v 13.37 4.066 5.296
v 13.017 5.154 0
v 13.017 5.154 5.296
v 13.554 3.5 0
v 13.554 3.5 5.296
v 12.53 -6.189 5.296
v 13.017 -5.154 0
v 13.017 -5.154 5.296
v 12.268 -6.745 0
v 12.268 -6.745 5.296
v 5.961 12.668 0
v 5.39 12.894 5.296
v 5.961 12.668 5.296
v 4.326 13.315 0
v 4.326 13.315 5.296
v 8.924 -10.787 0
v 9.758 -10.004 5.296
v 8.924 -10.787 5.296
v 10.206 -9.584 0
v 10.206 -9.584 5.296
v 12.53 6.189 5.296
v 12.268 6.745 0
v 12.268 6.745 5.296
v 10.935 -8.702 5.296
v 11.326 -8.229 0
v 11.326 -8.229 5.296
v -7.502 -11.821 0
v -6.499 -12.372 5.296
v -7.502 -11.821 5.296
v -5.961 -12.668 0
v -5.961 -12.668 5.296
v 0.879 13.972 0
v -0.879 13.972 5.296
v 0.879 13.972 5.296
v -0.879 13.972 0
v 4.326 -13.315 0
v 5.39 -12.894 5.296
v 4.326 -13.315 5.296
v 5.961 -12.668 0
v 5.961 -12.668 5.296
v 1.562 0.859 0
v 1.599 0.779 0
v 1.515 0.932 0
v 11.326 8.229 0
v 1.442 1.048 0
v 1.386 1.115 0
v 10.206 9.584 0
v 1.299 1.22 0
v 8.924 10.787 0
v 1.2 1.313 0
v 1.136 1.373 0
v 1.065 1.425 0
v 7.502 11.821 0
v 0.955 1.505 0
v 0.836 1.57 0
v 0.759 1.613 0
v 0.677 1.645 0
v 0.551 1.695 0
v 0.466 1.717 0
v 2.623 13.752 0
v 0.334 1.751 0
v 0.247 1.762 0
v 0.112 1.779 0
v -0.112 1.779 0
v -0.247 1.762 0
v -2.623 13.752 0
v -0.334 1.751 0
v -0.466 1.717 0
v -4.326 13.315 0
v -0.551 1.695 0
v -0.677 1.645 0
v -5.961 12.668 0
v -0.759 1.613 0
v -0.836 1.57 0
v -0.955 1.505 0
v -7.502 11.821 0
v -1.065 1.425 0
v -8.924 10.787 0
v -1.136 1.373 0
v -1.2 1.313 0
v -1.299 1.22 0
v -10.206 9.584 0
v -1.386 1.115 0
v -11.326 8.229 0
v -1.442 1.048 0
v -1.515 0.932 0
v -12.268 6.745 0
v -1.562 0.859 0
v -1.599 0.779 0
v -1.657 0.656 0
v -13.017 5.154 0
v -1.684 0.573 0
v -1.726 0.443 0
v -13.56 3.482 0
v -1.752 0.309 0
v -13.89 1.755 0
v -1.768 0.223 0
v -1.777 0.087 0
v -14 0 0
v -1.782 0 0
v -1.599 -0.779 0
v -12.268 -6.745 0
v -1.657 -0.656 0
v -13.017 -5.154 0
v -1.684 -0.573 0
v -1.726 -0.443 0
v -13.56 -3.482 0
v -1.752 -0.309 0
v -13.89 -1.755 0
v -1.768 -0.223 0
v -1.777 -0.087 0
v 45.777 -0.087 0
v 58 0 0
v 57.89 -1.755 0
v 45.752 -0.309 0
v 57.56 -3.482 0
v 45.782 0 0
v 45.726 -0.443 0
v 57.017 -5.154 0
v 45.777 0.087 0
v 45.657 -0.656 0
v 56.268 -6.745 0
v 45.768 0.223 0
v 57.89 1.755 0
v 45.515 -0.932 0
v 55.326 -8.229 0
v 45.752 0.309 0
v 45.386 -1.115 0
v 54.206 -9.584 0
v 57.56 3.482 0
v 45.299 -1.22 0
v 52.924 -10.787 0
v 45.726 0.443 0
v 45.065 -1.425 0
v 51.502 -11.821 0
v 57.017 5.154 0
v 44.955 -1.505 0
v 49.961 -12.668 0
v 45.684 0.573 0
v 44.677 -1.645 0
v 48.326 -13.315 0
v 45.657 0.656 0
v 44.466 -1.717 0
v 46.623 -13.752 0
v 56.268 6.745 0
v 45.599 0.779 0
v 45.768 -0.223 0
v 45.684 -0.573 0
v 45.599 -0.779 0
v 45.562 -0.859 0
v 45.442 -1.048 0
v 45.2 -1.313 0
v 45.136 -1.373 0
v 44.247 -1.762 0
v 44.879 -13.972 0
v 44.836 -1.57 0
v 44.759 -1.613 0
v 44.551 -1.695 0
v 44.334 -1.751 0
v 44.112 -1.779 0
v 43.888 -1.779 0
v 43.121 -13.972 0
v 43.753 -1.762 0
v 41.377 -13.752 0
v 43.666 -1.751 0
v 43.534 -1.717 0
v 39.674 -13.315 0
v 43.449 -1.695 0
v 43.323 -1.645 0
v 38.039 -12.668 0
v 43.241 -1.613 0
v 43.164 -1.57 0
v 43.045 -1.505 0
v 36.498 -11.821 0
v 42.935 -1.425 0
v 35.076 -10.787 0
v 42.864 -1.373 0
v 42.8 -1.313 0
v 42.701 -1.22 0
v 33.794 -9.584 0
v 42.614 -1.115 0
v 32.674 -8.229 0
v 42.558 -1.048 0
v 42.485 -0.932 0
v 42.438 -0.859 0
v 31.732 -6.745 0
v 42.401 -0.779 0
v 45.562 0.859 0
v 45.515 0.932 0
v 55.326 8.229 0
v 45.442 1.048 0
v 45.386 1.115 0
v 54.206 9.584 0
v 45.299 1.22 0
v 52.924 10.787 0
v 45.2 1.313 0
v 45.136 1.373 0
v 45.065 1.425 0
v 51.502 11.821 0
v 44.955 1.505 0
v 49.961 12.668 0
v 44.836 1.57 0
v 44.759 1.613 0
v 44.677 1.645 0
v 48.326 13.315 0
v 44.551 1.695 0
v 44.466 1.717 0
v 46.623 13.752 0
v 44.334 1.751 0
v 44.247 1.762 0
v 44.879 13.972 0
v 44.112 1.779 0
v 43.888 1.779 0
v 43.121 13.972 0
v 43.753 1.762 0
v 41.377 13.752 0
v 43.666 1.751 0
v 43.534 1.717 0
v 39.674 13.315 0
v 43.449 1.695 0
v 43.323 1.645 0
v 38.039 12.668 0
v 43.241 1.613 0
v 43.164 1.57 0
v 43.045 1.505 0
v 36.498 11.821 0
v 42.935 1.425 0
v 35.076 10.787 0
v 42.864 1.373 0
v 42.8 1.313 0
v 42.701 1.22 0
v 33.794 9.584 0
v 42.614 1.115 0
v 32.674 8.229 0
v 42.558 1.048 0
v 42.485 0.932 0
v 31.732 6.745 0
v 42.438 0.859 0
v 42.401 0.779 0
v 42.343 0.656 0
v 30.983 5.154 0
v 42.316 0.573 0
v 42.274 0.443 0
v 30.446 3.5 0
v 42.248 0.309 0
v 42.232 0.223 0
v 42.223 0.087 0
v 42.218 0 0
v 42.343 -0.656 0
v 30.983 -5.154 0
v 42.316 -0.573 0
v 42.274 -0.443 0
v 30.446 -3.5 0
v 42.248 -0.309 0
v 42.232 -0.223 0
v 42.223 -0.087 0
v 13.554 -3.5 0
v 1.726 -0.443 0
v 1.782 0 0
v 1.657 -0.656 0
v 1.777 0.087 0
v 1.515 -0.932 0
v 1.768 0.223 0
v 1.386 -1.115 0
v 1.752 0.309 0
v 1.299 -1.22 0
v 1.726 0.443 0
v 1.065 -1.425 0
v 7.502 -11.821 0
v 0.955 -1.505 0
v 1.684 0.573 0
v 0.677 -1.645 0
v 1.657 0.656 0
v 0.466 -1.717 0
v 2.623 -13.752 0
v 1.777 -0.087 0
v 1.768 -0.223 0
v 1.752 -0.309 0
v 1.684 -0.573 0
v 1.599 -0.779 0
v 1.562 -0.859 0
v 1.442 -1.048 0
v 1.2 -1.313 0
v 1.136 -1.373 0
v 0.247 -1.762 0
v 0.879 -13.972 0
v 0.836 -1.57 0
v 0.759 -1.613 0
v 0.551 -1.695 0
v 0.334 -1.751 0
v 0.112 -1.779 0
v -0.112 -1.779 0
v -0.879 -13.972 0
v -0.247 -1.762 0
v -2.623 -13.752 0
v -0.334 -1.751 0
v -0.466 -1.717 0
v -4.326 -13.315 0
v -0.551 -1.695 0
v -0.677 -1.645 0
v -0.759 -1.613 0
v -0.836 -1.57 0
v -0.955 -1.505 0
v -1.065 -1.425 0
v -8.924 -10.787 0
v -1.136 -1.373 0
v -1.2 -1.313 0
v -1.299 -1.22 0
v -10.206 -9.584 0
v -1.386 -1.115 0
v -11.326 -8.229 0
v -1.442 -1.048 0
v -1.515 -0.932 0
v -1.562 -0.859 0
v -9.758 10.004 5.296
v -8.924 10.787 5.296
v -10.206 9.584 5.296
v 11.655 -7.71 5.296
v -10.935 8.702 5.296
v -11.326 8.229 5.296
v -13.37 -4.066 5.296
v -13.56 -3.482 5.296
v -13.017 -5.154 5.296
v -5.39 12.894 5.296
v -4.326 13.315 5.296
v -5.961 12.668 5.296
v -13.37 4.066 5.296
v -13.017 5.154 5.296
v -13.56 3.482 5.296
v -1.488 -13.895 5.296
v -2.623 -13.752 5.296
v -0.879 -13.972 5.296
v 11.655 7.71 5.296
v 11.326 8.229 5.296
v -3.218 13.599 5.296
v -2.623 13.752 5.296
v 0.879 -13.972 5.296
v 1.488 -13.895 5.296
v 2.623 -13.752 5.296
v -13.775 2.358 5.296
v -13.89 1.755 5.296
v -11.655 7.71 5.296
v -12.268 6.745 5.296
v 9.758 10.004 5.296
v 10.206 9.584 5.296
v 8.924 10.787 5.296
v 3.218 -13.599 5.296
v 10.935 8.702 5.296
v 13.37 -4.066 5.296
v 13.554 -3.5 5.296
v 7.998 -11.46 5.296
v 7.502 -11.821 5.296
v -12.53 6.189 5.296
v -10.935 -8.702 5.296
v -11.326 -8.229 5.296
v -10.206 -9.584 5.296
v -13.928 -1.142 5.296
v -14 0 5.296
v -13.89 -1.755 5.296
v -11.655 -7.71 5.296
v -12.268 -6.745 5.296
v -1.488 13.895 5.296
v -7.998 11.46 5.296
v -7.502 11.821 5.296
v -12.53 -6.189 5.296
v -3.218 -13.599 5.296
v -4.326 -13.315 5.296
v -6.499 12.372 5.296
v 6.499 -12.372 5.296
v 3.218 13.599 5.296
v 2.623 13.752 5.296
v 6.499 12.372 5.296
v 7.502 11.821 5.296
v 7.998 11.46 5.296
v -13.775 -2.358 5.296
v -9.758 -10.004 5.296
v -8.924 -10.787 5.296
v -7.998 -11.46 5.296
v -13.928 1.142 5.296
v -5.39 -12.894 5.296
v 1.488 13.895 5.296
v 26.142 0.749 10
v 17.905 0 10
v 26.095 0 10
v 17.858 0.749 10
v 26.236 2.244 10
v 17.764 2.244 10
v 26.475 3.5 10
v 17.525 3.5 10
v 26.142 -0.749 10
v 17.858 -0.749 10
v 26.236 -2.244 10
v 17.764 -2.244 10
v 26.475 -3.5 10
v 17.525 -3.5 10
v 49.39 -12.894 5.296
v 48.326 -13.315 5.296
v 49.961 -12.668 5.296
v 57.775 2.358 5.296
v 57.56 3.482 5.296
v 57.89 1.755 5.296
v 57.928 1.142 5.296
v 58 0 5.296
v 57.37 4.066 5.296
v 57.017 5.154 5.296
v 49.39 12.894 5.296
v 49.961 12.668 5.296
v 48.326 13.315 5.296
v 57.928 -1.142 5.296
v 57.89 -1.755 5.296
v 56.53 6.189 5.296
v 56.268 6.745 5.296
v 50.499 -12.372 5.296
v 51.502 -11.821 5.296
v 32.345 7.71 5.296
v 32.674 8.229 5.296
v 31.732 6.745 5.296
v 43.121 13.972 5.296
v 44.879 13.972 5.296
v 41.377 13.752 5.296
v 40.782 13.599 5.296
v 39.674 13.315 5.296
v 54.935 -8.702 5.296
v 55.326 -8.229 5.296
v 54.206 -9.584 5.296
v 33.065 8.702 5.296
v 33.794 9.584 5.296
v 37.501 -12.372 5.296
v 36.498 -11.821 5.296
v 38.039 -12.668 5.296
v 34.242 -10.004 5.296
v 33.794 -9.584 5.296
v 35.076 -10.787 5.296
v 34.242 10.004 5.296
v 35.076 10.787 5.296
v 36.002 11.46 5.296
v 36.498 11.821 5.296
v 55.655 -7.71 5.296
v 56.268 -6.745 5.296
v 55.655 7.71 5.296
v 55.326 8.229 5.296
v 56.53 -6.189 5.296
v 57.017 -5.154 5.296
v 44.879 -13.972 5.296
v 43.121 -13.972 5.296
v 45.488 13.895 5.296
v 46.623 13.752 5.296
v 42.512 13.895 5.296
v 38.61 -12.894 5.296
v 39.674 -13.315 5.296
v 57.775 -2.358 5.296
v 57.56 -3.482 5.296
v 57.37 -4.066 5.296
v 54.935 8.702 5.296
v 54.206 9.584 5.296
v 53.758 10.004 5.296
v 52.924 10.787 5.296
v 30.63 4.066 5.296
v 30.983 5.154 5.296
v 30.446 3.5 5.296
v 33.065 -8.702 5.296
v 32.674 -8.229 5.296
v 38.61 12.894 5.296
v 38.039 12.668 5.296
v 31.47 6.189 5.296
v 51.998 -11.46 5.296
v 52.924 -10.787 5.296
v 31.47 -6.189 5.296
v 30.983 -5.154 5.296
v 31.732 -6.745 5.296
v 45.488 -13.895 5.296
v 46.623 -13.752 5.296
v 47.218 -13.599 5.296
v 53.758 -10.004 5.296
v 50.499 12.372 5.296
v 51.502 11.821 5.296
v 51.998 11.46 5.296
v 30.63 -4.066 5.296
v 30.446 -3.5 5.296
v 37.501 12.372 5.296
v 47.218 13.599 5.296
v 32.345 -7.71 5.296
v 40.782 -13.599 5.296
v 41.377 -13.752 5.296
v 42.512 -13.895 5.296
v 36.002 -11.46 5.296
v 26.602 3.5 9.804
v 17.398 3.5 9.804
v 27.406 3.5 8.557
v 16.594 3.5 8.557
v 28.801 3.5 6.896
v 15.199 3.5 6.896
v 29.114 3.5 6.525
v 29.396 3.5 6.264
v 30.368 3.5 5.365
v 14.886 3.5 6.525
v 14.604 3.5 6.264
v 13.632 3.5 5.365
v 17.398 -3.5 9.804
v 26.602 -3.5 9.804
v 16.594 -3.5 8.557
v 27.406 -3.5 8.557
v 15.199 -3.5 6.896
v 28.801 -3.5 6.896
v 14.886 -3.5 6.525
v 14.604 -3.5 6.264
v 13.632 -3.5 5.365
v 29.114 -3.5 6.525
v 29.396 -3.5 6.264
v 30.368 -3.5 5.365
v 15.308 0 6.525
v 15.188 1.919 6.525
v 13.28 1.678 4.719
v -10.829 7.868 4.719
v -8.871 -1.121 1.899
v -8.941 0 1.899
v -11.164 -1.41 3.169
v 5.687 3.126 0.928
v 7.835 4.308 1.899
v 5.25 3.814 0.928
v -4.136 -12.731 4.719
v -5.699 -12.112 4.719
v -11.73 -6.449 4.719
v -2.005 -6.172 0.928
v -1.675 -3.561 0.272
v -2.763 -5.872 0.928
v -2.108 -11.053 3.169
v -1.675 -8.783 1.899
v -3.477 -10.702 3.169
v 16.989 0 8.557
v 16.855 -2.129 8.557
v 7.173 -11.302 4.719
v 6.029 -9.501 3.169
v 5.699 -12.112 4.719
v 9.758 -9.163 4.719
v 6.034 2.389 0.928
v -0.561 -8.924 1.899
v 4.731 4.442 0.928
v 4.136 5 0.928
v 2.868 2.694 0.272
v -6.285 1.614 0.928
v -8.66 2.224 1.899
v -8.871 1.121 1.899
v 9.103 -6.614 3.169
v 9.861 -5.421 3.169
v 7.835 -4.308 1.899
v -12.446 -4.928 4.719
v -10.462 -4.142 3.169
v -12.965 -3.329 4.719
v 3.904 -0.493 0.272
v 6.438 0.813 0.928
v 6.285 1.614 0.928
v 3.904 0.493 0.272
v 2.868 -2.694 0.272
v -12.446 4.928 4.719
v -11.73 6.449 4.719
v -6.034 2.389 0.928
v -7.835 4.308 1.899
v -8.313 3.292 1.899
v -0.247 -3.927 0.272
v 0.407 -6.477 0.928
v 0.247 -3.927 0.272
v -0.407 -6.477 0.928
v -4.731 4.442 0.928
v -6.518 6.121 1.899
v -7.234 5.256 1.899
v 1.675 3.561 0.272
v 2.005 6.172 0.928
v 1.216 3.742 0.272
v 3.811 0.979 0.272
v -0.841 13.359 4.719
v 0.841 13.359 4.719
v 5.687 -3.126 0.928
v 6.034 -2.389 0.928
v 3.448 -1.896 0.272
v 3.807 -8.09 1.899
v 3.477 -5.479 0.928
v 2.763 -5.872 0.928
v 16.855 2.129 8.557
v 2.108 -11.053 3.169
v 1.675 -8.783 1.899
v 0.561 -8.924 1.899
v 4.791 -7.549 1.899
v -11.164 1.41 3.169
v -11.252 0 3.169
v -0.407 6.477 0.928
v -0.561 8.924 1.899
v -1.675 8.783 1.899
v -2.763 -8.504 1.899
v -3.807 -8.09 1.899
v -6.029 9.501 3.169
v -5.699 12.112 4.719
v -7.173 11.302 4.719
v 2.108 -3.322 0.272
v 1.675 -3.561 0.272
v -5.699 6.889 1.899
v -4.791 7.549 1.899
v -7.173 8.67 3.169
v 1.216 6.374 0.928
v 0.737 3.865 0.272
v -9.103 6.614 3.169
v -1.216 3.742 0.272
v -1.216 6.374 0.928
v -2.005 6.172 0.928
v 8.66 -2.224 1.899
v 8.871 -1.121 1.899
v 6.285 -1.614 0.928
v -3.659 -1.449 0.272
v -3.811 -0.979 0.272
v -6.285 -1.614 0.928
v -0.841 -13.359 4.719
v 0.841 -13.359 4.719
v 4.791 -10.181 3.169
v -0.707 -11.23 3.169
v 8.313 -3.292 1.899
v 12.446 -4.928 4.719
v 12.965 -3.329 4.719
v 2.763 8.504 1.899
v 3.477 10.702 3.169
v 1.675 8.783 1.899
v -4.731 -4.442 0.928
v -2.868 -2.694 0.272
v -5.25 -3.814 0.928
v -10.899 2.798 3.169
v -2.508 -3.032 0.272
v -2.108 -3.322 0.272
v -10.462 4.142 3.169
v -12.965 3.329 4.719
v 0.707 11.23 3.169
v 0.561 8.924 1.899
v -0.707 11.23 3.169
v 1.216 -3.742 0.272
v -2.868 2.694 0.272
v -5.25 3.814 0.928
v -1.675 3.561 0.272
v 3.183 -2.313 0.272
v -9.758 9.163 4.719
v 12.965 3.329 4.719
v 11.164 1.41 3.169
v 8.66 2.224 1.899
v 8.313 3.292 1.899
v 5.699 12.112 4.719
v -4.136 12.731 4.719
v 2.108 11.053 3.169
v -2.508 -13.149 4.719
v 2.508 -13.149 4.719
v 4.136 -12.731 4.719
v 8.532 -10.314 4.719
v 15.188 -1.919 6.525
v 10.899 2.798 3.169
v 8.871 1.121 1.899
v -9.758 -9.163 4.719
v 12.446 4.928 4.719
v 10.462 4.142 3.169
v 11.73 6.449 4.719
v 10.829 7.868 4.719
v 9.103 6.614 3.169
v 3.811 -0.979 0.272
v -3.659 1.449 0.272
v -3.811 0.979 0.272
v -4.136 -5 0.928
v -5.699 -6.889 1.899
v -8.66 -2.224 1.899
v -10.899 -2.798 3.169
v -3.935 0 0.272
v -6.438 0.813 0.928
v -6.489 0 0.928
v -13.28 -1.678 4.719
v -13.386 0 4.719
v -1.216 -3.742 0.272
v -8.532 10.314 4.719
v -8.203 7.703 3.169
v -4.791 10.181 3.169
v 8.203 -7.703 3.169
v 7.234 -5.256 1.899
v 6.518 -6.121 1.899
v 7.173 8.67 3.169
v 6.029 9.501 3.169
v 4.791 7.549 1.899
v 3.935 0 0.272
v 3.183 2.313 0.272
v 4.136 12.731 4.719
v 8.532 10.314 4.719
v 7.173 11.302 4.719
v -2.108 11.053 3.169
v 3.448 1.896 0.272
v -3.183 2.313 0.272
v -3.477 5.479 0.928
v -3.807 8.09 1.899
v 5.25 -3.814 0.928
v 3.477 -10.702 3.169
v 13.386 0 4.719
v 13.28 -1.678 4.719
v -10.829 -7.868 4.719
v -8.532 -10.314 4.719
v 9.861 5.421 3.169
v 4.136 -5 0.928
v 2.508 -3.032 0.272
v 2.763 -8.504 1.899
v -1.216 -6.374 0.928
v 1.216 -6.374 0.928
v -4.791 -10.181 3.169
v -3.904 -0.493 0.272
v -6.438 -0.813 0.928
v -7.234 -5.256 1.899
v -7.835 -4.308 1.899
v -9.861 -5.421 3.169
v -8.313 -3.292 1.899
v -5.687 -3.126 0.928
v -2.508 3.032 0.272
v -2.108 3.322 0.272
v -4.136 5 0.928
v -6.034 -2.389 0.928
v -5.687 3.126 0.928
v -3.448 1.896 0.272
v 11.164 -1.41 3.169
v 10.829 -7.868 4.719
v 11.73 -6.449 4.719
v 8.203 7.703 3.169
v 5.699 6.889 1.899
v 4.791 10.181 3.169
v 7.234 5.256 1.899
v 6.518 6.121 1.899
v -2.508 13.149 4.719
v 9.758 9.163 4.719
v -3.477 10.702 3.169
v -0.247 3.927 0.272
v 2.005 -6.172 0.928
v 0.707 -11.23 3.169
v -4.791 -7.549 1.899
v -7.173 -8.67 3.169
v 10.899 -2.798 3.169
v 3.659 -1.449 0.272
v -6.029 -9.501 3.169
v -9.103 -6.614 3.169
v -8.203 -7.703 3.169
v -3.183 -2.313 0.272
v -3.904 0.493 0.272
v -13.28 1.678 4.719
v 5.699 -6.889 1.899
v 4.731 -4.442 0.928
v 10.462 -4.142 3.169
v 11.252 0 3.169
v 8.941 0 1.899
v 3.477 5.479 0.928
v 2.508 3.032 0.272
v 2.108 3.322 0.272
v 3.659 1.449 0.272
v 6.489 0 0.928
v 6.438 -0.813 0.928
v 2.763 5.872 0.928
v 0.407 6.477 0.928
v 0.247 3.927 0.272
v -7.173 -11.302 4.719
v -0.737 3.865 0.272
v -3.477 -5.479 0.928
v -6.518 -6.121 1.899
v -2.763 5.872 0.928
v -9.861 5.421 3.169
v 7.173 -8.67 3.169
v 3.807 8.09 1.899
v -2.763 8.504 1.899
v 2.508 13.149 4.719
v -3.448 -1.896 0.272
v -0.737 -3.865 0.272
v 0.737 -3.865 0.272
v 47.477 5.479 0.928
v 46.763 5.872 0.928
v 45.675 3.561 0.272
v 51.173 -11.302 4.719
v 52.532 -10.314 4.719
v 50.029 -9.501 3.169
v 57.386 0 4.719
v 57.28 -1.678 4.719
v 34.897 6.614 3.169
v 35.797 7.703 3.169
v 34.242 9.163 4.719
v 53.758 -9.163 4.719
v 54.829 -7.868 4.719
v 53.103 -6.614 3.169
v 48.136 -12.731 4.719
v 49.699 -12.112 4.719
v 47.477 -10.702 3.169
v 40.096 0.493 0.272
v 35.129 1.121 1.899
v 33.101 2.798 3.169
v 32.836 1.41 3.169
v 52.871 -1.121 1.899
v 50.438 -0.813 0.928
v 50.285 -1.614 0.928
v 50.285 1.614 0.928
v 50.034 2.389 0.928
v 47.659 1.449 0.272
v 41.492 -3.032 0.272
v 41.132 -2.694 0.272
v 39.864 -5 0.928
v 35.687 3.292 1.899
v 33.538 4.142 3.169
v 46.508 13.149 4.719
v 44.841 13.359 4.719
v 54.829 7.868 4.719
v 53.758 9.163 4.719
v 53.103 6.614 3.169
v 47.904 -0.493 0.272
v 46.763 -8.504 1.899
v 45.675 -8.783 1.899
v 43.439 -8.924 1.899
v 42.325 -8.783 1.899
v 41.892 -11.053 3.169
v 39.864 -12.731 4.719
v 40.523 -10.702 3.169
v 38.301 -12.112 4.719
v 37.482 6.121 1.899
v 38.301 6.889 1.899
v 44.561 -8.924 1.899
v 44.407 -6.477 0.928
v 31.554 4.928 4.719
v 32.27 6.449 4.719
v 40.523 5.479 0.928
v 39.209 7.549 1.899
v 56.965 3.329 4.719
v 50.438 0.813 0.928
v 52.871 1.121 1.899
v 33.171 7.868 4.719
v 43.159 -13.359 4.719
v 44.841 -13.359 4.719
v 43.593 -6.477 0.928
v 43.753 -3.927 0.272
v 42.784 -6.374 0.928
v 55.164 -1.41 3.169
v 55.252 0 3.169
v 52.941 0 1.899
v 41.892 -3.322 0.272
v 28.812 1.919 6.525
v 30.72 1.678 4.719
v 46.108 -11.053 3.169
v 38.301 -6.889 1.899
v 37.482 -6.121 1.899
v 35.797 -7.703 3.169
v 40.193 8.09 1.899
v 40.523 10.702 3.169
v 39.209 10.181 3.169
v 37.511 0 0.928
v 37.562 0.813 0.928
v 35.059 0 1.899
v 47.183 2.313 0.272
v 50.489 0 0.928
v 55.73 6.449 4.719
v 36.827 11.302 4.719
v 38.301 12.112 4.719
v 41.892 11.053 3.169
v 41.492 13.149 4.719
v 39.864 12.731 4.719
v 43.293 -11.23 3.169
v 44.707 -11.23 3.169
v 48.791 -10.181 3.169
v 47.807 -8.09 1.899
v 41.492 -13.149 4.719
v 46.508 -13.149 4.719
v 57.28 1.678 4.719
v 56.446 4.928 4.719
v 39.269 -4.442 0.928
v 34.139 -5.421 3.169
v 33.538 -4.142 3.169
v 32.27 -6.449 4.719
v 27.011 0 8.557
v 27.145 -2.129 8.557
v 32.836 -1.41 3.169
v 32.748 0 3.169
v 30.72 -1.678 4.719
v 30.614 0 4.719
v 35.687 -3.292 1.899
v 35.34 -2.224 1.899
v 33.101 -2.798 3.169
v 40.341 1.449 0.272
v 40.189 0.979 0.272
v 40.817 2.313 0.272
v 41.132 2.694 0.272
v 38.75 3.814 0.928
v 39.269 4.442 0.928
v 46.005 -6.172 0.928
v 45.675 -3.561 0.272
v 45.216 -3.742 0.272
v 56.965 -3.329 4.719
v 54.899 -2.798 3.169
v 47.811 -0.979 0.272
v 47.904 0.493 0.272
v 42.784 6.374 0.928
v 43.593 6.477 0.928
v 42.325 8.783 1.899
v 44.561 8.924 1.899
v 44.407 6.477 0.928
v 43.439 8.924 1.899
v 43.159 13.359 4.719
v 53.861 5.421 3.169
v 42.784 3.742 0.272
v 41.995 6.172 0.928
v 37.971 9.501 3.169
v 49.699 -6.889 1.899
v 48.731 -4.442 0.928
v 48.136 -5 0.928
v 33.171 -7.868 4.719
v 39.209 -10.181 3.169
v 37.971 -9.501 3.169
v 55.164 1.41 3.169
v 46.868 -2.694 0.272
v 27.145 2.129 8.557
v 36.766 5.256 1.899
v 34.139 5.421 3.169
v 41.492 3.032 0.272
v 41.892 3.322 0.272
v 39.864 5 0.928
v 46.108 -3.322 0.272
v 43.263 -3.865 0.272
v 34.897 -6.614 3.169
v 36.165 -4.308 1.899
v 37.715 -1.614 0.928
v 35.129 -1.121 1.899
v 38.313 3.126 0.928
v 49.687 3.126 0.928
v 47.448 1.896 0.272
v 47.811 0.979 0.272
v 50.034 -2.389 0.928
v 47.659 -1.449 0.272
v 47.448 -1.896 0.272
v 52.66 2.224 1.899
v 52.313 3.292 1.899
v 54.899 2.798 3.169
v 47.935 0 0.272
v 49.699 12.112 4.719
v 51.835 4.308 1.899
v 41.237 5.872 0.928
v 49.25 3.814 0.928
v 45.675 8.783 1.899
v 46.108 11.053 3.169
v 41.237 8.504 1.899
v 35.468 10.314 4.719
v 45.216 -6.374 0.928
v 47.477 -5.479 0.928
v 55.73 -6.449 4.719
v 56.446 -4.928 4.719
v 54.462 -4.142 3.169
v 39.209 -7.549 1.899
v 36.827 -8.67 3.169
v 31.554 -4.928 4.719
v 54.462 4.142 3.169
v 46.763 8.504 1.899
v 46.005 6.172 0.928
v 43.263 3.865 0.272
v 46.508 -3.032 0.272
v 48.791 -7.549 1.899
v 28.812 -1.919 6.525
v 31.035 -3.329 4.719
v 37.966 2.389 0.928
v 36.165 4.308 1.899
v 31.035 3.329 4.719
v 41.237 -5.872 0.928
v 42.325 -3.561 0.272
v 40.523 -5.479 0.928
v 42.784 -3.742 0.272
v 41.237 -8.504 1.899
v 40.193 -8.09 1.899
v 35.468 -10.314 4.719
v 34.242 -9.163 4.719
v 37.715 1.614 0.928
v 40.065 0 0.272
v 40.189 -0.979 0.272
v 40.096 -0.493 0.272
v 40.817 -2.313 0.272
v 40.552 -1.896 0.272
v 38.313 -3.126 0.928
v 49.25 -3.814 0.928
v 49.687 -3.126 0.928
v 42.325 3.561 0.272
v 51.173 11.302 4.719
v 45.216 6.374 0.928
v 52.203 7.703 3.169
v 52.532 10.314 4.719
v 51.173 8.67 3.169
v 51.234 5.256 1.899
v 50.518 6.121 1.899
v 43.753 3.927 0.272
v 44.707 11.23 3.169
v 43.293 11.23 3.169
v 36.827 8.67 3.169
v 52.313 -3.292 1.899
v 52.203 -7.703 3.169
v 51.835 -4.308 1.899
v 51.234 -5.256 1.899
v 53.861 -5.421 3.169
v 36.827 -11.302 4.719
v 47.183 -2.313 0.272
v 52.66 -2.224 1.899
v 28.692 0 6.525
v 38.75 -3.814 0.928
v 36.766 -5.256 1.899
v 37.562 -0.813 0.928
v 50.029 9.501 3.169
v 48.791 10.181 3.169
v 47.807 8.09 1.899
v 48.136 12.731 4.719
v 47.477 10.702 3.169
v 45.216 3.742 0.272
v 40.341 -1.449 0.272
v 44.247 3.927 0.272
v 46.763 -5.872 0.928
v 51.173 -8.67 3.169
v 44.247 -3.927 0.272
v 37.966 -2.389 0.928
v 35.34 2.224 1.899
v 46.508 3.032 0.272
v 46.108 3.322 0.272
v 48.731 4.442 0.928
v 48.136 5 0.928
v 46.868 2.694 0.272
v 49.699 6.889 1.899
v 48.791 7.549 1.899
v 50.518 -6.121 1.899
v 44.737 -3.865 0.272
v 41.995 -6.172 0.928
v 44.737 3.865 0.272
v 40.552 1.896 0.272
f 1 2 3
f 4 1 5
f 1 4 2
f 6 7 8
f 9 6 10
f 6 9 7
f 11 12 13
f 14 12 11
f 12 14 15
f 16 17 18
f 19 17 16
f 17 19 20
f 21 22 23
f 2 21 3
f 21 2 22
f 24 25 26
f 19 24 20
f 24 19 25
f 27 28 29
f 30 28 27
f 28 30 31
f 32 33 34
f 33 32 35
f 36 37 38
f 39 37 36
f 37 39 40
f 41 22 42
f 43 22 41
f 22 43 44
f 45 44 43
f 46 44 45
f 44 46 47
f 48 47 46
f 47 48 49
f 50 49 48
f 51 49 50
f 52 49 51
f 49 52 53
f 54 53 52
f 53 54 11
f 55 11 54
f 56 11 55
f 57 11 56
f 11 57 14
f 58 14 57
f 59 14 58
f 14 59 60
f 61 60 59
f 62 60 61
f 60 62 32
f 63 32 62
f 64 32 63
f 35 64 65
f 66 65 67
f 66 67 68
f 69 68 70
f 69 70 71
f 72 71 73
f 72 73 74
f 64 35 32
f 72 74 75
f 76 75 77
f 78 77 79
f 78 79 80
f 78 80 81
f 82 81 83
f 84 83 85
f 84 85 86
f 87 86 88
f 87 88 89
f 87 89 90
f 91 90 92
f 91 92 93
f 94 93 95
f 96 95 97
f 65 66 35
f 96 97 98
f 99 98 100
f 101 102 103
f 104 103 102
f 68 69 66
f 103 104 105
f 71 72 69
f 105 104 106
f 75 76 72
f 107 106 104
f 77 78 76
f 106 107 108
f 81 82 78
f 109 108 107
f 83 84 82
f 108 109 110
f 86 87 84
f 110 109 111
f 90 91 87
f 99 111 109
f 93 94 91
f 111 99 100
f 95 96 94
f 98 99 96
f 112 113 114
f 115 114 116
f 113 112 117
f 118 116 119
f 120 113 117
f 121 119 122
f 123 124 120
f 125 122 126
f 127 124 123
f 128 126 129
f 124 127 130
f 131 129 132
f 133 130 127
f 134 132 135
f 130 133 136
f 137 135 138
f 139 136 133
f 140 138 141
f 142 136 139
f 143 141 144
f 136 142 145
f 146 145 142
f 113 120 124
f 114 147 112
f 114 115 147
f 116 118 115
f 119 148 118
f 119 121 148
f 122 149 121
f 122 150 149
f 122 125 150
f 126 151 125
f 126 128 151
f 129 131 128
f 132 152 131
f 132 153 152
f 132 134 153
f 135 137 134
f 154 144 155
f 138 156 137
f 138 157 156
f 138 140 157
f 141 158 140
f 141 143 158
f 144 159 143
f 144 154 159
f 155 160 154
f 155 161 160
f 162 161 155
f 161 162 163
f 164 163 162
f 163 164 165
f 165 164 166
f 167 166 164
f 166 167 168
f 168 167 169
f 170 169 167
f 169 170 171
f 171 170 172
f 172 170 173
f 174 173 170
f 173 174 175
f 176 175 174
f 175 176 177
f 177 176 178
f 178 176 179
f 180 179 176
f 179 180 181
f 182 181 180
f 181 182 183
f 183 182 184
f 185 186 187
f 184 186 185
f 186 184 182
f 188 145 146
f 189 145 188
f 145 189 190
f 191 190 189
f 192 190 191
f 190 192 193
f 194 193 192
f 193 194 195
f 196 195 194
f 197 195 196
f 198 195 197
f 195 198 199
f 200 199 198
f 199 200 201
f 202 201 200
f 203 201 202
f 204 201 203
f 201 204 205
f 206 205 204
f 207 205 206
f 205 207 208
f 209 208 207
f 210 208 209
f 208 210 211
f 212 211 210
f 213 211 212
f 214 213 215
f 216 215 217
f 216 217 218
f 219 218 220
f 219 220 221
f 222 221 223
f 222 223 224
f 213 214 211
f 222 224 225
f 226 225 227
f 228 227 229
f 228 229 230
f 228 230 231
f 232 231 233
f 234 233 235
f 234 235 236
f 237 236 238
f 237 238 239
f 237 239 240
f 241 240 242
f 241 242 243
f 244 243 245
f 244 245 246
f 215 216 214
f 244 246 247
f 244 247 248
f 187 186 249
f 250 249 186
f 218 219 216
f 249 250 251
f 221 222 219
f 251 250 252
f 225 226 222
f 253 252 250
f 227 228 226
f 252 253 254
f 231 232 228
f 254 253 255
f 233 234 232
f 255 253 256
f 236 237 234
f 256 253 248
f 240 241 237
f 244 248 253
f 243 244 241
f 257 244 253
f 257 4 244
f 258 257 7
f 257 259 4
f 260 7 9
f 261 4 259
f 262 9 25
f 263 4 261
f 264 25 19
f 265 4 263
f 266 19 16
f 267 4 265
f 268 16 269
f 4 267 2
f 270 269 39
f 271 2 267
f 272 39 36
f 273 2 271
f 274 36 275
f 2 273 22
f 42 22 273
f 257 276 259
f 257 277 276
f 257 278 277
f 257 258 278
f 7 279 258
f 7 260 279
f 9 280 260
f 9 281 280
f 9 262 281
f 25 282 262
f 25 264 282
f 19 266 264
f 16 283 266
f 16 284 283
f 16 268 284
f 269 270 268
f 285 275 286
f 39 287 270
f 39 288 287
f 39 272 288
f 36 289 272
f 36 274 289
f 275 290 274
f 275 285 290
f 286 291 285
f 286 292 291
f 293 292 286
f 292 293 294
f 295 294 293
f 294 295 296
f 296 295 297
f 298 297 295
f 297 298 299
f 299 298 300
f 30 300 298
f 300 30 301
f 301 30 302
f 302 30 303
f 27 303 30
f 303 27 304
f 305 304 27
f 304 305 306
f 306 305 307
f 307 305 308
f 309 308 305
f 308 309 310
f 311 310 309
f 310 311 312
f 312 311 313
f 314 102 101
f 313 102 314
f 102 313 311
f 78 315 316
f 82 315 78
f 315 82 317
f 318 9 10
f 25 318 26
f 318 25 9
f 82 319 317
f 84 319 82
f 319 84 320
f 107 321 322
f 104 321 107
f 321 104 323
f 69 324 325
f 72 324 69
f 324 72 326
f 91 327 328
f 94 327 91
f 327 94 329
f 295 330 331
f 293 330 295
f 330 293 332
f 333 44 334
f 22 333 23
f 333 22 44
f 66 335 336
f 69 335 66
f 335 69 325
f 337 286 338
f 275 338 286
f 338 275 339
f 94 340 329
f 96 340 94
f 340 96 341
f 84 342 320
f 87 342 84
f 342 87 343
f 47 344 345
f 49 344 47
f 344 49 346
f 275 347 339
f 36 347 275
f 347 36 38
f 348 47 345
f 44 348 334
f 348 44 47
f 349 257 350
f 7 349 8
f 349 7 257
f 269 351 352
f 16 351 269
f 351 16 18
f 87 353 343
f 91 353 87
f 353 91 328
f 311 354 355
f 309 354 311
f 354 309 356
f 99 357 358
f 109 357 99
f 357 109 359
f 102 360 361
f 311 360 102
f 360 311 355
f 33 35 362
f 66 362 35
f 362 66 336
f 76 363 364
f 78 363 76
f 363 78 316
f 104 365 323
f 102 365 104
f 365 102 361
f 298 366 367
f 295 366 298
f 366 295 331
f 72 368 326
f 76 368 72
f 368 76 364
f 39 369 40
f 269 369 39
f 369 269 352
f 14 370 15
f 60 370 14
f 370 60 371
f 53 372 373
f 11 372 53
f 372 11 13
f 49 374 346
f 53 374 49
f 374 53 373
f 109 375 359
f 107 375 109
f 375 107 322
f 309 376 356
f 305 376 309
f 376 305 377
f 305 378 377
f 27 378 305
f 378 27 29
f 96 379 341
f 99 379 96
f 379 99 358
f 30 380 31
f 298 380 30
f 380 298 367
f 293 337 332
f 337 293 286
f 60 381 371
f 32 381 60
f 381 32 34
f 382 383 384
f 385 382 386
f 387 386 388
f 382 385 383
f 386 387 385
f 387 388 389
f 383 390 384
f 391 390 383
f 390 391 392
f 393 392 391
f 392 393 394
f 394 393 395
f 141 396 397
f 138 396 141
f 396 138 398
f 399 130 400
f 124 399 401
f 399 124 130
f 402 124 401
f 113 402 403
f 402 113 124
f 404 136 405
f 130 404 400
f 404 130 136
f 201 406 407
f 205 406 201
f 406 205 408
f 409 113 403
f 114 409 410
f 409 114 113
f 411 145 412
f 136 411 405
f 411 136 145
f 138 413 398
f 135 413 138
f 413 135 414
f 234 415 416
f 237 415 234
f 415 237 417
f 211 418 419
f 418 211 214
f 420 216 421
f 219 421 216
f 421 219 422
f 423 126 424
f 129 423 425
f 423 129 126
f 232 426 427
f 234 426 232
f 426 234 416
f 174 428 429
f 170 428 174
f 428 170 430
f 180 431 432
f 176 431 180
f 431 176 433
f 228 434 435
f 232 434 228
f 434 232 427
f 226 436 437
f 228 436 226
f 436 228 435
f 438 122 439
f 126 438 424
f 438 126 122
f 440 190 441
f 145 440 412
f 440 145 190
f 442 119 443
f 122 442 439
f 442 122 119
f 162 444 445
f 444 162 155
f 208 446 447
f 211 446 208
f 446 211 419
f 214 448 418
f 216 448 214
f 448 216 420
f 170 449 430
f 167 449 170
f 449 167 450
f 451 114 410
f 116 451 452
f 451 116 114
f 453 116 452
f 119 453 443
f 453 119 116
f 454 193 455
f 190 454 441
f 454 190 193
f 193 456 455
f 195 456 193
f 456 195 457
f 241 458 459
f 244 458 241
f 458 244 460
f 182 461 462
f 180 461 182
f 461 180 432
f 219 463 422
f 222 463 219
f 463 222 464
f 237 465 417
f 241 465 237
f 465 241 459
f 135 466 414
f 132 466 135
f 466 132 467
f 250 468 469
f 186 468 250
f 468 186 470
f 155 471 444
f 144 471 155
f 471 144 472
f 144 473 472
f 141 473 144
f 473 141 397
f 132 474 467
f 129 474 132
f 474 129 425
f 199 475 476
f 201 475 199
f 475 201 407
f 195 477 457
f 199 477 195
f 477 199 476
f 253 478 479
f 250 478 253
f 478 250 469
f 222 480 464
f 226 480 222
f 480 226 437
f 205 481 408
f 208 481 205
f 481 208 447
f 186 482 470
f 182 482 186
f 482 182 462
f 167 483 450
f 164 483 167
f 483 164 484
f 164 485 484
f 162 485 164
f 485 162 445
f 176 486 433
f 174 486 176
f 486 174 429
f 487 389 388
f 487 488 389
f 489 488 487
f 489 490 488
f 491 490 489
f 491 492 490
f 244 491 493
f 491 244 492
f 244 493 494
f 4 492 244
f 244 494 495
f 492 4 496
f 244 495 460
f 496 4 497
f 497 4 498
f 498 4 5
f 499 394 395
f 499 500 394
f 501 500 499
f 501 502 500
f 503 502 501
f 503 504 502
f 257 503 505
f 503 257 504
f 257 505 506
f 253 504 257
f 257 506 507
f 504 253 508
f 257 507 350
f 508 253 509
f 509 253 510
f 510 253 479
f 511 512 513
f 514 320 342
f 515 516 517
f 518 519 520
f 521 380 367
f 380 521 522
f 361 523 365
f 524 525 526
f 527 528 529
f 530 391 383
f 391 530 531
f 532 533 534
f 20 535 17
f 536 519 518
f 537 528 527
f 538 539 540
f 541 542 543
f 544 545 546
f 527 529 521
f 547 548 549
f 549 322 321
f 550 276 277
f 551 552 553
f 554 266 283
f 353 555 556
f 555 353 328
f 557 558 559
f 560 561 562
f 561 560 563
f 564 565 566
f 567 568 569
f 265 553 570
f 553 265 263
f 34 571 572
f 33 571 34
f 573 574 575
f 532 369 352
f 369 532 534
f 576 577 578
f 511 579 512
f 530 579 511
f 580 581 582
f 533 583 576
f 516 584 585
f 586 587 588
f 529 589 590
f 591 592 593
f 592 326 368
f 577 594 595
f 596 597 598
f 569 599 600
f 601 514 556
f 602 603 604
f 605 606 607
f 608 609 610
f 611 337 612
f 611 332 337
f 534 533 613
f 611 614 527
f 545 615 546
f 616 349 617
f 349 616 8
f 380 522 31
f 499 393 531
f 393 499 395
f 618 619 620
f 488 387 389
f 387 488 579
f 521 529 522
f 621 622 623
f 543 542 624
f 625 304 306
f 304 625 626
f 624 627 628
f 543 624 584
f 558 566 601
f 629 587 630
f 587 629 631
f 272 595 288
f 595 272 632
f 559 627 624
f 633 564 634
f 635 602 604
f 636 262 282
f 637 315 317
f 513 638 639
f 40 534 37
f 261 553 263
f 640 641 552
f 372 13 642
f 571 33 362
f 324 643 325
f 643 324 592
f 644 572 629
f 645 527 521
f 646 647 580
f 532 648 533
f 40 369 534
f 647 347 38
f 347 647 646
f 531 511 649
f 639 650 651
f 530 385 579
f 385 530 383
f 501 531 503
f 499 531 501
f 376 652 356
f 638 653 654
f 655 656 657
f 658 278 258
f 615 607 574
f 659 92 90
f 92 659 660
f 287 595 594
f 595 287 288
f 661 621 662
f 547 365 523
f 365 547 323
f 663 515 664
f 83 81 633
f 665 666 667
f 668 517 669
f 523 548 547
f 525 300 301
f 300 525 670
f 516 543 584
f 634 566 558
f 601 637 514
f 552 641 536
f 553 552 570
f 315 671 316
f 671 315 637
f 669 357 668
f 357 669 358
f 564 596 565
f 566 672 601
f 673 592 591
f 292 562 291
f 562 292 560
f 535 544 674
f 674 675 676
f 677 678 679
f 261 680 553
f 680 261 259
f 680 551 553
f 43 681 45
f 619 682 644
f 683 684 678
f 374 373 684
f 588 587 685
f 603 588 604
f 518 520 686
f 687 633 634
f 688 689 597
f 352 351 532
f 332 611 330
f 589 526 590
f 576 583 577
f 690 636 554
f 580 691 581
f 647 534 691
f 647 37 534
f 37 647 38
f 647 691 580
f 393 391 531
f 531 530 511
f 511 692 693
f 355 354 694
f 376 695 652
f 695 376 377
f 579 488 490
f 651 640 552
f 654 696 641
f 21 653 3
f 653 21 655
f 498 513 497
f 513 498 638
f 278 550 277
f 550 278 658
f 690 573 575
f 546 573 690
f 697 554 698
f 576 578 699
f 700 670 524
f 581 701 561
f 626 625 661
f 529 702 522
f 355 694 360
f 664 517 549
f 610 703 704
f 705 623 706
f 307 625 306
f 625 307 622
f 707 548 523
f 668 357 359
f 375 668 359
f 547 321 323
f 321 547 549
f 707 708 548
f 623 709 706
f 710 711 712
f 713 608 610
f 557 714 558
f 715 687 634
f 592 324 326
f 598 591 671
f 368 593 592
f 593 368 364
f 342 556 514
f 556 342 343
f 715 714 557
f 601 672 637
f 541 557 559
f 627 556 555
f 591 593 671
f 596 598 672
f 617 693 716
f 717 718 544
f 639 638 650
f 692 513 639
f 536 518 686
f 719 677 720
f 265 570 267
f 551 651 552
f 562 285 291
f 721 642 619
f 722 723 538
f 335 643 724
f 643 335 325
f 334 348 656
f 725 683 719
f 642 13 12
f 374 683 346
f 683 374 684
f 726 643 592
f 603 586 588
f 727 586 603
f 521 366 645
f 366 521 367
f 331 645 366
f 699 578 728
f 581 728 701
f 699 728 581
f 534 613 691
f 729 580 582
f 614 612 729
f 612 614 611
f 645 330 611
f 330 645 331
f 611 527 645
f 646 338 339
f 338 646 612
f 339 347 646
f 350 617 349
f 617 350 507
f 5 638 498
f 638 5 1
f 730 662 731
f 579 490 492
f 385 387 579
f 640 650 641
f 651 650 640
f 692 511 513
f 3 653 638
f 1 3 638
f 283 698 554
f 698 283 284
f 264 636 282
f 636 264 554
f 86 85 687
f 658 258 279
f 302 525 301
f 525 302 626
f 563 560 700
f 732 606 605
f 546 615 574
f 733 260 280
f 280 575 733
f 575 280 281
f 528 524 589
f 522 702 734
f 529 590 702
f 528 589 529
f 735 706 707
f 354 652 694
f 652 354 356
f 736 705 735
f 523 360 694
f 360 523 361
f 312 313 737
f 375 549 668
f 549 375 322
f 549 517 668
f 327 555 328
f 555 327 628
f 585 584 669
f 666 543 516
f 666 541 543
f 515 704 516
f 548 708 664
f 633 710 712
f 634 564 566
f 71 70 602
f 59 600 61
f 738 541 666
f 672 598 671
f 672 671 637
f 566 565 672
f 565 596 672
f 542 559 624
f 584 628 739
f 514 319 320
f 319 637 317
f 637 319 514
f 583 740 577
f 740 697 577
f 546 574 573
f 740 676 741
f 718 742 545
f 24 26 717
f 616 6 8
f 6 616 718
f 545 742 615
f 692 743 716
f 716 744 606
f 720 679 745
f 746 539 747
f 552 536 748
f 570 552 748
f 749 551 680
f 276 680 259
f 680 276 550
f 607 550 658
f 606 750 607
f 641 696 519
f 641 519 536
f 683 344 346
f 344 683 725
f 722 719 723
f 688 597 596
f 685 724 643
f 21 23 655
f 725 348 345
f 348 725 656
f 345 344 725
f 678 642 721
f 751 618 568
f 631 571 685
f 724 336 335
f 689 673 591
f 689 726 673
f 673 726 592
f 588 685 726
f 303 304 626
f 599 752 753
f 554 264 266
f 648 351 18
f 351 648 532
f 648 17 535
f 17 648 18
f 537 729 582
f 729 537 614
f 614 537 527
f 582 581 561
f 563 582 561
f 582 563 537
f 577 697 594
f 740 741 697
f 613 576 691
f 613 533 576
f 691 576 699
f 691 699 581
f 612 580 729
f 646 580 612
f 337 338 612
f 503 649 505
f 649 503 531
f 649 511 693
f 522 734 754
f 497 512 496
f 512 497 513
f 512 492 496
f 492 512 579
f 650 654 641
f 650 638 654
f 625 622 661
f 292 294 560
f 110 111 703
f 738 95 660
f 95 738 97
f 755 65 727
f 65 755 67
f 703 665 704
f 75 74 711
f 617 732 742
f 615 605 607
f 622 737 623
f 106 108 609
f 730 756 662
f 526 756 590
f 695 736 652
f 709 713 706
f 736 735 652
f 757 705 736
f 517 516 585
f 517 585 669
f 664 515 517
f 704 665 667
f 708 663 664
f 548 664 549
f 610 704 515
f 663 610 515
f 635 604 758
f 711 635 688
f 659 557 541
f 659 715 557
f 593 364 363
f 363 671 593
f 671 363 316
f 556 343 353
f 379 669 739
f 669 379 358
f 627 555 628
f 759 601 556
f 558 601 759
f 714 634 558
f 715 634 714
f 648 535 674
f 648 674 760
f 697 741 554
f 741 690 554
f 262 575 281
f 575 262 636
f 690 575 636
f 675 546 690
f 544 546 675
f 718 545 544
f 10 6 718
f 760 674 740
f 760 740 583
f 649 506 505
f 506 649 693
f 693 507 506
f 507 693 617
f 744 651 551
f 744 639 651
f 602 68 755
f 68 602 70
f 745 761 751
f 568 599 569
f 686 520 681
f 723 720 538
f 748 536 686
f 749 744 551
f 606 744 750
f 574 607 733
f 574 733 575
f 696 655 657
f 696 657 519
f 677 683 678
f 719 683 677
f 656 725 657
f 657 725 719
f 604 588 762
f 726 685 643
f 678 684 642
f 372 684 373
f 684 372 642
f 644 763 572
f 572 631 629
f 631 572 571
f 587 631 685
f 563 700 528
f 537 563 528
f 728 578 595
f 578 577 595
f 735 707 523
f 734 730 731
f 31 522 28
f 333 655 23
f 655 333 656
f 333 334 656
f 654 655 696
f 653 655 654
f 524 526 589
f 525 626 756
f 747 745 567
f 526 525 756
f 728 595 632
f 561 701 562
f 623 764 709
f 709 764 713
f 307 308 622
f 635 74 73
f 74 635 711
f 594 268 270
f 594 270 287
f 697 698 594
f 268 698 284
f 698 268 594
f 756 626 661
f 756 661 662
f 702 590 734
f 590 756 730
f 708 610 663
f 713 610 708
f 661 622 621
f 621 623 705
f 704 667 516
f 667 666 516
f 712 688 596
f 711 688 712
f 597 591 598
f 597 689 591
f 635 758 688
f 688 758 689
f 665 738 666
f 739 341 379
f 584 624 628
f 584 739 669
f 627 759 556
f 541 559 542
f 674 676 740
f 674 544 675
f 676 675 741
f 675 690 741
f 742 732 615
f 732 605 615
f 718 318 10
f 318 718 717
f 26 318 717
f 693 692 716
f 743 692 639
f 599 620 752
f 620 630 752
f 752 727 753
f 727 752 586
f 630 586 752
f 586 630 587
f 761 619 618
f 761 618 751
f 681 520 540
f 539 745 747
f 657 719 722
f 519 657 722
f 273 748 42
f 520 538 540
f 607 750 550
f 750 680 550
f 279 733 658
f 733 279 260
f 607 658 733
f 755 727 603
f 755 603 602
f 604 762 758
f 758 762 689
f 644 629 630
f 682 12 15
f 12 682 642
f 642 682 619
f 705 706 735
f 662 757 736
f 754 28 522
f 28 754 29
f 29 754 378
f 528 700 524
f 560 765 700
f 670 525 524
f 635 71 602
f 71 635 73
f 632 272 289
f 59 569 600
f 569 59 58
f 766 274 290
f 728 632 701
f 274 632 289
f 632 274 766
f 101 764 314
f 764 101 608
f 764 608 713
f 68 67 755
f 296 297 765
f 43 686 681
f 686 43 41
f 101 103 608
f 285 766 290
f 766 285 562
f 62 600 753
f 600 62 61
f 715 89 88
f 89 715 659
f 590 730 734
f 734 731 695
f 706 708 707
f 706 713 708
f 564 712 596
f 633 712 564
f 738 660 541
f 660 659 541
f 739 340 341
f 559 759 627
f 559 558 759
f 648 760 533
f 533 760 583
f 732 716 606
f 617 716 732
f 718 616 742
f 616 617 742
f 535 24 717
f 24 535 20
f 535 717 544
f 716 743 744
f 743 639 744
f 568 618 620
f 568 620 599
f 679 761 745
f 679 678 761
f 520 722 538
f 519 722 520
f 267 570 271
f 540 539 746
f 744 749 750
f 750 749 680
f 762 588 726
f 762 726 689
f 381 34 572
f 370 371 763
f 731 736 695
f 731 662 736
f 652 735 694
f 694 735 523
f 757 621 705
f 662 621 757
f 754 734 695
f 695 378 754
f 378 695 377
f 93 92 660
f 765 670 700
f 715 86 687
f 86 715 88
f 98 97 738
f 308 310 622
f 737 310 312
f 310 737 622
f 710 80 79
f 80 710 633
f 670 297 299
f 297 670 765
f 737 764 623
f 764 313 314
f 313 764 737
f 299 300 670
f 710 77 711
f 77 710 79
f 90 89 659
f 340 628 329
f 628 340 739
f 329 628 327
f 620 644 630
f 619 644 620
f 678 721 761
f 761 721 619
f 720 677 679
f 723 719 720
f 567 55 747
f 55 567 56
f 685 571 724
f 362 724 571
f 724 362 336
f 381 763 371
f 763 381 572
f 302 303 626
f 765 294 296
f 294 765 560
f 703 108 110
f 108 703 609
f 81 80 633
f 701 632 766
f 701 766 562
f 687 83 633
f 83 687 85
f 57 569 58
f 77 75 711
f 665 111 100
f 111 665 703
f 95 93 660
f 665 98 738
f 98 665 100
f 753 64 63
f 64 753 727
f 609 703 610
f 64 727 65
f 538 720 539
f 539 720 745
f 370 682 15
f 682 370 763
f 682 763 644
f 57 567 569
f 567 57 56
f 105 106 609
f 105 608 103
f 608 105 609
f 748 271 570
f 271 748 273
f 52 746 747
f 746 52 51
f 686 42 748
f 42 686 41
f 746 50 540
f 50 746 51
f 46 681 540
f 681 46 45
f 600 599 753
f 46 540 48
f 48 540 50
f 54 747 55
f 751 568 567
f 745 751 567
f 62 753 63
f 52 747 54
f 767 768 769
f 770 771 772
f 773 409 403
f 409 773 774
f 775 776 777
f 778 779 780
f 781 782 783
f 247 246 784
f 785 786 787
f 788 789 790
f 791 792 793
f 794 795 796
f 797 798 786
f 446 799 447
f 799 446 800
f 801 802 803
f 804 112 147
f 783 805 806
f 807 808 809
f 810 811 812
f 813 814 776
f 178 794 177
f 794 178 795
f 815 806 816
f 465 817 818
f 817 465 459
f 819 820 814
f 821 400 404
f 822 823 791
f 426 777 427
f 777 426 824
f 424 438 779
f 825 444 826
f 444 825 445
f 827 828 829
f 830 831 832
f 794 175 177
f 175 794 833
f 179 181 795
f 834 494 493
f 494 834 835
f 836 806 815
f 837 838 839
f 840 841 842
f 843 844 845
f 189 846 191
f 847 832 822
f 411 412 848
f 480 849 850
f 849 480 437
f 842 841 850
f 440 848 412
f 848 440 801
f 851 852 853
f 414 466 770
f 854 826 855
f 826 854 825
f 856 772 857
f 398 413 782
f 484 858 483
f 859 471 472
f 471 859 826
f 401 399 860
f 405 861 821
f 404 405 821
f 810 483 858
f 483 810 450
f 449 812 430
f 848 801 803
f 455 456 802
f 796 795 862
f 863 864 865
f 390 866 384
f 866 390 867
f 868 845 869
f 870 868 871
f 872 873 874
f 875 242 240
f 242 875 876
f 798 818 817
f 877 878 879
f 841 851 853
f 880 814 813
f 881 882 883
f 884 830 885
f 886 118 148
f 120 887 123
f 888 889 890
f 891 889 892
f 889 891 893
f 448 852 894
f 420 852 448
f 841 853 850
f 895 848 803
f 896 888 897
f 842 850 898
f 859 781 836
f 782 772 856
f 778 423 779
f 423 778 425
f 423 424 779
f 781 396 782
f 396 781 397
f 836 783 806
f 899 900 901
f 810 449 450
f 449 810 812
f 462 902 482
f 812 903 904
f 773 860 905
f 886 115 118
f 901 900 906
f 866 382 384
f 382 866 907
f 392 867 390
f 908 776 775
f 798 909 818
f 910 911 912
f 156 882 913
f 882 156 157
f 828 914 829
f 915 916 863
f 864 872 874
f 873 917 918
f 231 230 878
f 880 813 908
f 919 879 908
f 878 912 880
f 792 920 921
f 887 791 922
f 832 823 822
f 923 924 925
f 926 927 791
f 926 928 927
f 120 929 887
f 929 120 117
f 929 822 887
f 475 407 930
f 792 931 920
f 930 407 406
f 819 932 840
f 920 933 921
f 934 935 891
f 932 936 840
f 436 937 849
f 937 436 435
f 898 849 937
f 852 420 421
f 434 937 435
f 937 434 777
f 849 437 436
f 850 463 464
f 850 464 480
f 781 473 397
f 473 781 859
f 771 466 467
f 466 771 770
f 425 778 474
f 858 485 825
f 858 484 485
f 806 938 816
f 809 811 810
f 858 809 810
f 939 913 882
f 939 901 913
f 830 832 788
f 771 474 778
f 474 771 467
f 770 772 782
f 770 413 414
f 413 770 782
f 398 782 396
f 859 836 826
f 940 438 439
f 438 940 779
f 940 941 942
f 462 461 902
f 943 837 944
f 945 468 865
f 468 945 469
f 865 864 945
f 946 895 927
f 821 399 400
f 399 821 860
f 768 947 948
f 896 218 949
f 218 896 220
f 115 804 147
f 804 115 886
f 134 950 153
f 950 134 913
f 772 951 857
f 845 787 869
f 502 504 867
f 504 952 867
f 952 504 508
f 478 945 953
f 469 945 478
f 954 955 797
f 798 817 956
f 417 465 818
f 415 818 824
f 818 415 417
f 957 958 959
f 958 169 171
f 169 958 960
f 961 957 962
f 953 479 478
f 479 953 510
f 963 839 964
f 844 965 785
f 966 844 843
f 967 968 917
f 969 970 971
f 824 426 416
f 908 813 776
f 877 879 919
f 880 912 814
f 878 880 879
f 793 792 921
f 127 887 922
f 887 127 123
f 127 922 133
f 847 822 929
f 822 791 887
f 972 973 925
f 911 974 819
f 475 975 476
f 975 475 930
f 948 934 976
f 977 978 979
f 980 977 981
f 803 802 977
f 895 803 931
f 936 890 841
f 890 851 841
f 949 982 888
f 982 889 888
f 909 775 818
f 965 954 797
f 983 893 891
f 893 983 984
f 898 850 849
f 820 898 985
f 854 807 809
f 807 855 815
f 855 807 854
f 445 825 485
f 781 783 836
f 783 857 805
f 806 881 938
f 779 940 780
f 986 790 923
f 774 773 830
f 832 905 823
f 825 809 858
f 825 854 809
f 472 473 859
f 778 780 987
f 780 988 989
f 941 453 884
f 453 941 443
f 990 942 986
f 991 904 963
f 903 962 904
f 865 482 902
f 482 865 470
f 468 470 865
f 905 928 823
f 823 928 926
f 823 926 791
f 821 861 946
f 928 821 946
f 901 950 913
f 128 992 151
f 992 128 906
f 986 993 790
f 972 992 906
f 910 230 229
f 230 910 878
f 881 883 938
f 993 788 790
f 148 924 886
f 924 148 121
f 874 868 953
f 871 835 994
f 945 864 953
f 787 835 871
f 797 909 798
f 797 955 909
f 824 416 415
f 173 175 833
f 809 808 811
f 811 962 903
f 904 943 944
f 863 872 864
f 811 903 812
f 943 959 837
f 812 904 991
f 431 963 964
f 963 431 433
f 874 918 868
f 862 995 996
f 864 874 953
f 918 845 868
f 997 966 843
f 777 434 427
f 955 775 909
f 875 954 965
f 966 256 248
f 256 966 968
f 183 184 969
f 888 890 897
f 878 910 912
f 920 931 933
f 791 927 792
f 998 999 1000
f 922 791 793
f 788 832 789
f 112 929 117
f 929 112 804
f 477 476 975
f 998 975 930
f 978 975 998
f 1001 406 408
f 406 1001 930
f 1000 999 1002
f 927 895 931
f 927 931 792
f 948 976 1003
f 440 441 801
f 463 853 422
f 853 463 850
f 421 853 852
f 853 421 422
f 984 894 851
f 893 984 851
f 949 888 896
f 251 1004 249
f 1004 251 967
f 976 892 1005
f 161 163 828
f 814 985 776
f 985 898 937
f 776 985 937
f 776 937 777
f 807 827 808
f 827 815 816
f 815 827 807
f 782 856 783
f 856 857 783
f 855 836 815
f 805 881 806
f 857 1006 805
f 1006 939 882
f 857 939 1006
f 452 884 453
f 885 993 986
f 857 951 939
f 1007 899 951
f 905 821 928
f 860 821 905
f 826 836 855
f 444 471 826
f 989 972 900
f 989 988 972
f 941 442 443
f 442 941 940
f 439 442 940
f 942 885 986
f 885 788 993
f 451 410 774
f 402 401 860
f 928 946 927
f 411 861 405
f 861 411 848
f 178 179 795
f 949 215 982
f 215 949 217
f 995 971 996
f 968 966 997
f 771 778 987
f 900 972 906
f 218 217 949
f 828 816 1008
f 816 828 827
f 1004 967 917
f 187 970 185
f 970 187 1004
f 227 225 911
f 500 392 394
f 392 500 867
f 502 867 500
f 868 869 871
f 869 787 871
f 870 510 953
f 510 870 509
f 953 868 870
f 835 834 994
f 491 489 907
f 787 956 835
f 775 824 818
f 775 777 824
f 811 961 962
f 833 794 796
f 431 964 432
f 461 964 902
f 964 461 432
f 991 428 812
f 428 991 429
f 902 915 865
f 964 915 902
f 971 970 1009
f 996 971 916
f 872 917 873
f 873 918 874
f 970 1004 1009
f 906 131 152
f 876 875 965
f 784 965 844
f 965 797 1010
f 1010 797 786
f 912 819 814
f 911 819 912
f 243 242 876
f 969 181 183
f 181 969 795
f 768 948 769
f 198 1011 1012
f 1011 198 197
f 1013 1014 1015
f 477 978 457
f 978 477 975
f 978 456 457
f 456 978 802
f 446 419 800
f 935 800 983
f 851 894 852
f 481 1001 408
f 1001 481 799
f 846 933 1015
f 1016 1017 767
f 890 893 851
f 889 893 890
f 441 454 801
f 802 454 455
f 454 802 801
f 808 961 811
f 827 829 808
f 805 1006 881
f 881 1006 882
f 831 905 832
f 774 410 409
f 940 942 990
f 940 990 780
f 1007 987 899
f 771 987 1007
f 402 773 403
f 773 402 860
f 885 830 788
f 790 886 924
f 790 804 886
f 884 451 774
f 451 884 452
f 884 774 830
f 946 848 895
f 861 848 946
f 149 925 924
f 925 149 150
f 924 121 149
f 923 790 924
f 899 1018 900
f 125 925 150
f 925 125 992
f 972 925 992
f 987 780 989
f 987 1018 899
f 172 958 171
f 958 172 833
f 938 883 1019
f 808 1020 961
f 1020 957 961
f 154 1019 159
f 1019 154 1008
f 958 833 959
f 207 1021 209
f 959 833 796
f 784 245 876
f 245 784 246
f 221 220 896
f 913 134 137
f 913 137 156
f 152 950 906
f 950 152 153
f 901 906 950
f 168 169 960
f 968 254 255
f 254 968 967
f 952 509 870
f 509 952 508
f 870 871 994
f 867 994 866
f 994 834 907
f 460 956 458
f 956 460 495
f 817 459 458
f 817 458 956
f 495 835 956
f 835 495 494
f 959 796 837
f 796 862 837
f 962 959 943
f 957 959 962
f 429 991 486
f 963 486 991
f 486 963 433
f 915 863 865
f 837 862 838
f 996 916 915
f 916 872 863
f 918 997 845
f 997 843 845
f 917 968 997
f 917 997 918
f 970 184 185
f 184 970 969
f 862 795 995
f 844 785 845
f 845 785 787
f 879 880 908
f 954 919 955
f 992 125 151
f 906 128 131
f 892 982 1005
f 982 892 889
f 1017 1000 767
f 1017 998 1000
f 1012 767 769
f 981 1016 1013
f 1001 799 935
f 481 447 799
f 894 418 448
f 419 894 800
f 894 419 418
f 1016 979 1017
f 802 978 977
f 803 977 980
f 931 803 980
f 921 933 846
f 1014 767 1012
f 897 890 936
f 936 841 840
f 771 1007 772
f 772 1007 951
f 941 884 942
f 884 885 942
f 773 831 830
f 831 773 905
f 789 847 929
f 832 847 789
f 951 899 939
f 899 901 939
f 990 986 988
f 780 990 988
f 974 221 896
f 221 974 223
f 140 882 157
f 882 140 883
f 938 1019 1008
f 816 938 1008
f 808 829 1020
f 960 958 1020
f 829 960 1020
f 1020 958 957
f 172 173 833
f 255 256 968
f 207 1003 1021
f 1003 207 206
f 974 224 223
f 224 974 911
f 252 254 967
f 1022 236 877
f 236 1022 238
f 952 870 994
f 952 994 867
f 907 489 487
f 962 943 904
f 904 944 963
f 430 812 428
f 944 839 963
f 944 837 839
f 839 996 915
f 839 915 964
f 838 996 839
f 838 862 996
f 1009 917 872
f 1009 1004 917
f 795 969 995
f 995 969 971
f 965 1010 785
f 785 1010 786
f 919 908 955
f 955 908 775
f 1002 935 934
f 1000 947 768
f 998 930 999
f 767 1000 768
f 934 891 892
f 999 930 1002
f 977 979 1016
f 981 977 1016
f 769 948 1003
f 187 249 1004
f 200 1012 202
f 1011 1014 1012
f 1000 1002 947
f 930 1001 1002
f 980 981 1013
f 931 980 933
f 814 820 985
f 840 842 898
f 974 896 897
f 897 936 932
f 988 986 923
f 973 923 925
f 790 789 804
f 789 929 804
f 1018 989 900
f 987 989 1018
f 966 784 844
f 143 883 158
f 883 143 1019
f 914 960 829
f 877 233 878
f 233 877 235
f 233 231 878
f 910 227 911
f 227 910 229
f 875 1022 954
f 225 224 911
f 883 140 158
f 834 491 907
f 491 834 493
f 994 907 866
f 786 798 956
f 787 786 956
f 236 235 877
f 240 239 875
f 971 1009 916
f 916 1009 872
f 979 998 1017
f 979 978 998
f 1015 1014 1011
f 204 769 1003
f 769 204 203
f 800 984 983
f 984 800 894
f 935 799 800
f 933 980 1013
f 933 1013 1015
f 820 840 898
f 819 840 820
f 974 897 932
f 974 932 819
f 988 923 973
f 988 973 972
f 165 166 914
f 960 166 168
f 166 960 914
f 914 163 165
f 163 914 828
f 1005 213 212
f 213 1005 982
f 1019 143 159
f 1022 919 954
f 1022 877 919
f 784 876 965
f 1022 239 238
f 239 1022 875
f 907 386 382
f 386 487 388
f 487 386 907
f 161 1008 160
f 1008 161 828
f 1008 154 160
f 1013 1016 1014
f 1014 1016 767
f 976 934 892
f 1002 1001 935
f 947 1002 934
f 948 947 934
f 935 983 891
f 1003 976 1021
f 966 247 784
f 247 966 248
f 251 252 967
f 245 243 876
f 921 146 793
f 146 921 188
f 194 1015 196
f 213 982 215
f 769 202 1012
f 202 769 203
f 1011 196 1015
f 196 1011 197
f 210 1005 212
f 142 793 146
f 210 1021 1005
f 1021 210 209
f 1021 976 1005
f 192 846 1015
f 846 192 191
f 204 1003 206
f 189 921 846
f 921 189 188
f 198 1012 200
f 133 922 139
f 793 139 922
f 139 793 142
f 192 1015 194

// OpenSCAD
Baoding_balls_diameter = 42;  // diameters of balls
Max_Height = 10;   // maximum height at center part
Distance = 2;         // Distanceance of balls
$fn = 50;

bbRadius = Baoding_balls_diameter / 2;

difference() {
  mount();
  translate([0, 0, bbRadius - 0.1]) balls();
}

module mount() {
  cylinder(r = 2 * bbRadius / 3, h = Max_Height);
  translate([Baoding_balls_diameter + Distance, 0, 0]) cylinder(r = 2 * bbRadius / 3, h = Max_Height);
  translate([0, -bbRadius / 6, 0]) cube([2 * bbRadius, bbRadius / 3, Max_Height]);
}

module balls() {
  ball();
  translate([Baoding_balls_diameter + Distance, 0, 0]) ball();
}

module ball() {
  sphere(r = bbRadius);
}
